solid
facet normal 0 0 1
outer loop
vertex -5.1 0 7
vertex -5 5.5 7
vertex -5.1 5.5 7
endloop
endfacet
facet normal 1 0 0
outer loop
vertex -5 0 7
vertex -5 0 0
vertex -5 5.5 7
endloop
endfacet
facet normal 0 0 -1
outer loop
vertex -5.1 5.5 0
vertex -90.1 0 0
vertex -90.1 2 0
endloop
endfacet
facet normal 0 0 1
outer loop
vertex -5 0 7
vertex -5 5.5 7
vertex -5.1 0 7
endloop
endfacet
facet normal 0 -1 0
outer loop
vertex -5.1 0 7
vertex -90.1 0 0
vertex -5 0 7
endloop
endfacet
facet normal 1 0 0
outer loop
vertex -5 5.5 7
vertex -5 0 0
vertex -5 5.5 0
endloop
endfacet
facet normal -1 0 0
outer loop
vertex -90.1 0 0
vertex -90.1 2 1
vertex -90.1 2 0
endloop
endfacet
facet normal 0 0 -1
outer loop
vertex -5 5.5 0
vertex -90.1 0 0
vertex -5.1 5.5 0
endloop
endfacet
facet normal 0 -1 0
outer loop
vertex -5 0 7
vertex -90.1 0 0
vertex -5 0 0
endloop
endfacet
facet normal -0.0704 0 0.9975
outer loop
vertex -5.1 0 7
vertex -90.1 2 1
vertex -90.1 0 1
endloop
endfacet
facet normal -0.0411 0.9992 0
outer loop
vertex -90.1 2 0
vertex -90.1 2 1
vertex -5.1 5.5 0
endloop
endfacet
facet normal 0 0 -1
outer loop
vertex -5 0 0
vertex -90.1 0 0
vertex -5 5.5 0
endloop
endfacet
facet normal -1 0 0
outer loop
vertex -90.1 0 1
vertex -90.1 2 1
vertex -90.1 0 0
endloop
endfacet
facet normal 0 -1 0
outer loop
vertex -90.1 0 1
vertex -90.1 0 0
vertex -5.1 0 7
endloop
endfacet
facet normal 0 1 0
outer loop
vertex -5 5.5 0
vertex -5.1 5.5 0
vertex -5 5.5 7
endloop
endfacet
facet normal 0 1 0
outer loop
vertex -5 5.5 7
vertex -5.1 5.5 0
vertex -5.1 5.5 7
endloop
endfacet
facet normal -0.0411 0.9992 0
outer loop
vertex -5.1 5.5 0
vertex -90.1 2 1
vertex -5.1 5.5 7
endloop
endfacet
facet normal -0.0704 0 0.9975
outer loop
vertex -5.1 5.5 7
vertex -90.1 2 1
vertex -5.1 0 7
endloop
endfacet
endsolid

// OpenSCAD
// file: branche-droite.scad
module fixation(){
   linear_extrude (height=1.01, $fn = 200)
    import (file="profil.dxf", layer="accroche-exterieur", $fn=500);
    translate([0,0,1])
     linear_extrude (height=3.5, $fn = 200)
    import (file="profil.dxf", layer="accroche", $fn=500);
    translate([0,0,4.499])
    linear_extrude (height=1.01, $fn = 200)
    import (file="profil.dxf", layer="accroche-exterieur", $fn=500);
   
}    
module branche_droite(){
        translate ([0,0,4])
        rotate([270,270,0])fixation(); 


        translate ([2.9999,0,0])
        linear_extrude (height=1, $fn = 200)
        import (file="profil.dxf", layer="0", $fn=500);

        hull(){
             translate ([4.9999,0,0])
             cube ([0.1,5.5,7]);
            
              translate ([90,0,0])
             cube ([0.1,2,1]);
        }
 }
 
branche_droite();
// main file
use <branche-droite.scad>

mirror ([1,0,0]) branche_droite();
